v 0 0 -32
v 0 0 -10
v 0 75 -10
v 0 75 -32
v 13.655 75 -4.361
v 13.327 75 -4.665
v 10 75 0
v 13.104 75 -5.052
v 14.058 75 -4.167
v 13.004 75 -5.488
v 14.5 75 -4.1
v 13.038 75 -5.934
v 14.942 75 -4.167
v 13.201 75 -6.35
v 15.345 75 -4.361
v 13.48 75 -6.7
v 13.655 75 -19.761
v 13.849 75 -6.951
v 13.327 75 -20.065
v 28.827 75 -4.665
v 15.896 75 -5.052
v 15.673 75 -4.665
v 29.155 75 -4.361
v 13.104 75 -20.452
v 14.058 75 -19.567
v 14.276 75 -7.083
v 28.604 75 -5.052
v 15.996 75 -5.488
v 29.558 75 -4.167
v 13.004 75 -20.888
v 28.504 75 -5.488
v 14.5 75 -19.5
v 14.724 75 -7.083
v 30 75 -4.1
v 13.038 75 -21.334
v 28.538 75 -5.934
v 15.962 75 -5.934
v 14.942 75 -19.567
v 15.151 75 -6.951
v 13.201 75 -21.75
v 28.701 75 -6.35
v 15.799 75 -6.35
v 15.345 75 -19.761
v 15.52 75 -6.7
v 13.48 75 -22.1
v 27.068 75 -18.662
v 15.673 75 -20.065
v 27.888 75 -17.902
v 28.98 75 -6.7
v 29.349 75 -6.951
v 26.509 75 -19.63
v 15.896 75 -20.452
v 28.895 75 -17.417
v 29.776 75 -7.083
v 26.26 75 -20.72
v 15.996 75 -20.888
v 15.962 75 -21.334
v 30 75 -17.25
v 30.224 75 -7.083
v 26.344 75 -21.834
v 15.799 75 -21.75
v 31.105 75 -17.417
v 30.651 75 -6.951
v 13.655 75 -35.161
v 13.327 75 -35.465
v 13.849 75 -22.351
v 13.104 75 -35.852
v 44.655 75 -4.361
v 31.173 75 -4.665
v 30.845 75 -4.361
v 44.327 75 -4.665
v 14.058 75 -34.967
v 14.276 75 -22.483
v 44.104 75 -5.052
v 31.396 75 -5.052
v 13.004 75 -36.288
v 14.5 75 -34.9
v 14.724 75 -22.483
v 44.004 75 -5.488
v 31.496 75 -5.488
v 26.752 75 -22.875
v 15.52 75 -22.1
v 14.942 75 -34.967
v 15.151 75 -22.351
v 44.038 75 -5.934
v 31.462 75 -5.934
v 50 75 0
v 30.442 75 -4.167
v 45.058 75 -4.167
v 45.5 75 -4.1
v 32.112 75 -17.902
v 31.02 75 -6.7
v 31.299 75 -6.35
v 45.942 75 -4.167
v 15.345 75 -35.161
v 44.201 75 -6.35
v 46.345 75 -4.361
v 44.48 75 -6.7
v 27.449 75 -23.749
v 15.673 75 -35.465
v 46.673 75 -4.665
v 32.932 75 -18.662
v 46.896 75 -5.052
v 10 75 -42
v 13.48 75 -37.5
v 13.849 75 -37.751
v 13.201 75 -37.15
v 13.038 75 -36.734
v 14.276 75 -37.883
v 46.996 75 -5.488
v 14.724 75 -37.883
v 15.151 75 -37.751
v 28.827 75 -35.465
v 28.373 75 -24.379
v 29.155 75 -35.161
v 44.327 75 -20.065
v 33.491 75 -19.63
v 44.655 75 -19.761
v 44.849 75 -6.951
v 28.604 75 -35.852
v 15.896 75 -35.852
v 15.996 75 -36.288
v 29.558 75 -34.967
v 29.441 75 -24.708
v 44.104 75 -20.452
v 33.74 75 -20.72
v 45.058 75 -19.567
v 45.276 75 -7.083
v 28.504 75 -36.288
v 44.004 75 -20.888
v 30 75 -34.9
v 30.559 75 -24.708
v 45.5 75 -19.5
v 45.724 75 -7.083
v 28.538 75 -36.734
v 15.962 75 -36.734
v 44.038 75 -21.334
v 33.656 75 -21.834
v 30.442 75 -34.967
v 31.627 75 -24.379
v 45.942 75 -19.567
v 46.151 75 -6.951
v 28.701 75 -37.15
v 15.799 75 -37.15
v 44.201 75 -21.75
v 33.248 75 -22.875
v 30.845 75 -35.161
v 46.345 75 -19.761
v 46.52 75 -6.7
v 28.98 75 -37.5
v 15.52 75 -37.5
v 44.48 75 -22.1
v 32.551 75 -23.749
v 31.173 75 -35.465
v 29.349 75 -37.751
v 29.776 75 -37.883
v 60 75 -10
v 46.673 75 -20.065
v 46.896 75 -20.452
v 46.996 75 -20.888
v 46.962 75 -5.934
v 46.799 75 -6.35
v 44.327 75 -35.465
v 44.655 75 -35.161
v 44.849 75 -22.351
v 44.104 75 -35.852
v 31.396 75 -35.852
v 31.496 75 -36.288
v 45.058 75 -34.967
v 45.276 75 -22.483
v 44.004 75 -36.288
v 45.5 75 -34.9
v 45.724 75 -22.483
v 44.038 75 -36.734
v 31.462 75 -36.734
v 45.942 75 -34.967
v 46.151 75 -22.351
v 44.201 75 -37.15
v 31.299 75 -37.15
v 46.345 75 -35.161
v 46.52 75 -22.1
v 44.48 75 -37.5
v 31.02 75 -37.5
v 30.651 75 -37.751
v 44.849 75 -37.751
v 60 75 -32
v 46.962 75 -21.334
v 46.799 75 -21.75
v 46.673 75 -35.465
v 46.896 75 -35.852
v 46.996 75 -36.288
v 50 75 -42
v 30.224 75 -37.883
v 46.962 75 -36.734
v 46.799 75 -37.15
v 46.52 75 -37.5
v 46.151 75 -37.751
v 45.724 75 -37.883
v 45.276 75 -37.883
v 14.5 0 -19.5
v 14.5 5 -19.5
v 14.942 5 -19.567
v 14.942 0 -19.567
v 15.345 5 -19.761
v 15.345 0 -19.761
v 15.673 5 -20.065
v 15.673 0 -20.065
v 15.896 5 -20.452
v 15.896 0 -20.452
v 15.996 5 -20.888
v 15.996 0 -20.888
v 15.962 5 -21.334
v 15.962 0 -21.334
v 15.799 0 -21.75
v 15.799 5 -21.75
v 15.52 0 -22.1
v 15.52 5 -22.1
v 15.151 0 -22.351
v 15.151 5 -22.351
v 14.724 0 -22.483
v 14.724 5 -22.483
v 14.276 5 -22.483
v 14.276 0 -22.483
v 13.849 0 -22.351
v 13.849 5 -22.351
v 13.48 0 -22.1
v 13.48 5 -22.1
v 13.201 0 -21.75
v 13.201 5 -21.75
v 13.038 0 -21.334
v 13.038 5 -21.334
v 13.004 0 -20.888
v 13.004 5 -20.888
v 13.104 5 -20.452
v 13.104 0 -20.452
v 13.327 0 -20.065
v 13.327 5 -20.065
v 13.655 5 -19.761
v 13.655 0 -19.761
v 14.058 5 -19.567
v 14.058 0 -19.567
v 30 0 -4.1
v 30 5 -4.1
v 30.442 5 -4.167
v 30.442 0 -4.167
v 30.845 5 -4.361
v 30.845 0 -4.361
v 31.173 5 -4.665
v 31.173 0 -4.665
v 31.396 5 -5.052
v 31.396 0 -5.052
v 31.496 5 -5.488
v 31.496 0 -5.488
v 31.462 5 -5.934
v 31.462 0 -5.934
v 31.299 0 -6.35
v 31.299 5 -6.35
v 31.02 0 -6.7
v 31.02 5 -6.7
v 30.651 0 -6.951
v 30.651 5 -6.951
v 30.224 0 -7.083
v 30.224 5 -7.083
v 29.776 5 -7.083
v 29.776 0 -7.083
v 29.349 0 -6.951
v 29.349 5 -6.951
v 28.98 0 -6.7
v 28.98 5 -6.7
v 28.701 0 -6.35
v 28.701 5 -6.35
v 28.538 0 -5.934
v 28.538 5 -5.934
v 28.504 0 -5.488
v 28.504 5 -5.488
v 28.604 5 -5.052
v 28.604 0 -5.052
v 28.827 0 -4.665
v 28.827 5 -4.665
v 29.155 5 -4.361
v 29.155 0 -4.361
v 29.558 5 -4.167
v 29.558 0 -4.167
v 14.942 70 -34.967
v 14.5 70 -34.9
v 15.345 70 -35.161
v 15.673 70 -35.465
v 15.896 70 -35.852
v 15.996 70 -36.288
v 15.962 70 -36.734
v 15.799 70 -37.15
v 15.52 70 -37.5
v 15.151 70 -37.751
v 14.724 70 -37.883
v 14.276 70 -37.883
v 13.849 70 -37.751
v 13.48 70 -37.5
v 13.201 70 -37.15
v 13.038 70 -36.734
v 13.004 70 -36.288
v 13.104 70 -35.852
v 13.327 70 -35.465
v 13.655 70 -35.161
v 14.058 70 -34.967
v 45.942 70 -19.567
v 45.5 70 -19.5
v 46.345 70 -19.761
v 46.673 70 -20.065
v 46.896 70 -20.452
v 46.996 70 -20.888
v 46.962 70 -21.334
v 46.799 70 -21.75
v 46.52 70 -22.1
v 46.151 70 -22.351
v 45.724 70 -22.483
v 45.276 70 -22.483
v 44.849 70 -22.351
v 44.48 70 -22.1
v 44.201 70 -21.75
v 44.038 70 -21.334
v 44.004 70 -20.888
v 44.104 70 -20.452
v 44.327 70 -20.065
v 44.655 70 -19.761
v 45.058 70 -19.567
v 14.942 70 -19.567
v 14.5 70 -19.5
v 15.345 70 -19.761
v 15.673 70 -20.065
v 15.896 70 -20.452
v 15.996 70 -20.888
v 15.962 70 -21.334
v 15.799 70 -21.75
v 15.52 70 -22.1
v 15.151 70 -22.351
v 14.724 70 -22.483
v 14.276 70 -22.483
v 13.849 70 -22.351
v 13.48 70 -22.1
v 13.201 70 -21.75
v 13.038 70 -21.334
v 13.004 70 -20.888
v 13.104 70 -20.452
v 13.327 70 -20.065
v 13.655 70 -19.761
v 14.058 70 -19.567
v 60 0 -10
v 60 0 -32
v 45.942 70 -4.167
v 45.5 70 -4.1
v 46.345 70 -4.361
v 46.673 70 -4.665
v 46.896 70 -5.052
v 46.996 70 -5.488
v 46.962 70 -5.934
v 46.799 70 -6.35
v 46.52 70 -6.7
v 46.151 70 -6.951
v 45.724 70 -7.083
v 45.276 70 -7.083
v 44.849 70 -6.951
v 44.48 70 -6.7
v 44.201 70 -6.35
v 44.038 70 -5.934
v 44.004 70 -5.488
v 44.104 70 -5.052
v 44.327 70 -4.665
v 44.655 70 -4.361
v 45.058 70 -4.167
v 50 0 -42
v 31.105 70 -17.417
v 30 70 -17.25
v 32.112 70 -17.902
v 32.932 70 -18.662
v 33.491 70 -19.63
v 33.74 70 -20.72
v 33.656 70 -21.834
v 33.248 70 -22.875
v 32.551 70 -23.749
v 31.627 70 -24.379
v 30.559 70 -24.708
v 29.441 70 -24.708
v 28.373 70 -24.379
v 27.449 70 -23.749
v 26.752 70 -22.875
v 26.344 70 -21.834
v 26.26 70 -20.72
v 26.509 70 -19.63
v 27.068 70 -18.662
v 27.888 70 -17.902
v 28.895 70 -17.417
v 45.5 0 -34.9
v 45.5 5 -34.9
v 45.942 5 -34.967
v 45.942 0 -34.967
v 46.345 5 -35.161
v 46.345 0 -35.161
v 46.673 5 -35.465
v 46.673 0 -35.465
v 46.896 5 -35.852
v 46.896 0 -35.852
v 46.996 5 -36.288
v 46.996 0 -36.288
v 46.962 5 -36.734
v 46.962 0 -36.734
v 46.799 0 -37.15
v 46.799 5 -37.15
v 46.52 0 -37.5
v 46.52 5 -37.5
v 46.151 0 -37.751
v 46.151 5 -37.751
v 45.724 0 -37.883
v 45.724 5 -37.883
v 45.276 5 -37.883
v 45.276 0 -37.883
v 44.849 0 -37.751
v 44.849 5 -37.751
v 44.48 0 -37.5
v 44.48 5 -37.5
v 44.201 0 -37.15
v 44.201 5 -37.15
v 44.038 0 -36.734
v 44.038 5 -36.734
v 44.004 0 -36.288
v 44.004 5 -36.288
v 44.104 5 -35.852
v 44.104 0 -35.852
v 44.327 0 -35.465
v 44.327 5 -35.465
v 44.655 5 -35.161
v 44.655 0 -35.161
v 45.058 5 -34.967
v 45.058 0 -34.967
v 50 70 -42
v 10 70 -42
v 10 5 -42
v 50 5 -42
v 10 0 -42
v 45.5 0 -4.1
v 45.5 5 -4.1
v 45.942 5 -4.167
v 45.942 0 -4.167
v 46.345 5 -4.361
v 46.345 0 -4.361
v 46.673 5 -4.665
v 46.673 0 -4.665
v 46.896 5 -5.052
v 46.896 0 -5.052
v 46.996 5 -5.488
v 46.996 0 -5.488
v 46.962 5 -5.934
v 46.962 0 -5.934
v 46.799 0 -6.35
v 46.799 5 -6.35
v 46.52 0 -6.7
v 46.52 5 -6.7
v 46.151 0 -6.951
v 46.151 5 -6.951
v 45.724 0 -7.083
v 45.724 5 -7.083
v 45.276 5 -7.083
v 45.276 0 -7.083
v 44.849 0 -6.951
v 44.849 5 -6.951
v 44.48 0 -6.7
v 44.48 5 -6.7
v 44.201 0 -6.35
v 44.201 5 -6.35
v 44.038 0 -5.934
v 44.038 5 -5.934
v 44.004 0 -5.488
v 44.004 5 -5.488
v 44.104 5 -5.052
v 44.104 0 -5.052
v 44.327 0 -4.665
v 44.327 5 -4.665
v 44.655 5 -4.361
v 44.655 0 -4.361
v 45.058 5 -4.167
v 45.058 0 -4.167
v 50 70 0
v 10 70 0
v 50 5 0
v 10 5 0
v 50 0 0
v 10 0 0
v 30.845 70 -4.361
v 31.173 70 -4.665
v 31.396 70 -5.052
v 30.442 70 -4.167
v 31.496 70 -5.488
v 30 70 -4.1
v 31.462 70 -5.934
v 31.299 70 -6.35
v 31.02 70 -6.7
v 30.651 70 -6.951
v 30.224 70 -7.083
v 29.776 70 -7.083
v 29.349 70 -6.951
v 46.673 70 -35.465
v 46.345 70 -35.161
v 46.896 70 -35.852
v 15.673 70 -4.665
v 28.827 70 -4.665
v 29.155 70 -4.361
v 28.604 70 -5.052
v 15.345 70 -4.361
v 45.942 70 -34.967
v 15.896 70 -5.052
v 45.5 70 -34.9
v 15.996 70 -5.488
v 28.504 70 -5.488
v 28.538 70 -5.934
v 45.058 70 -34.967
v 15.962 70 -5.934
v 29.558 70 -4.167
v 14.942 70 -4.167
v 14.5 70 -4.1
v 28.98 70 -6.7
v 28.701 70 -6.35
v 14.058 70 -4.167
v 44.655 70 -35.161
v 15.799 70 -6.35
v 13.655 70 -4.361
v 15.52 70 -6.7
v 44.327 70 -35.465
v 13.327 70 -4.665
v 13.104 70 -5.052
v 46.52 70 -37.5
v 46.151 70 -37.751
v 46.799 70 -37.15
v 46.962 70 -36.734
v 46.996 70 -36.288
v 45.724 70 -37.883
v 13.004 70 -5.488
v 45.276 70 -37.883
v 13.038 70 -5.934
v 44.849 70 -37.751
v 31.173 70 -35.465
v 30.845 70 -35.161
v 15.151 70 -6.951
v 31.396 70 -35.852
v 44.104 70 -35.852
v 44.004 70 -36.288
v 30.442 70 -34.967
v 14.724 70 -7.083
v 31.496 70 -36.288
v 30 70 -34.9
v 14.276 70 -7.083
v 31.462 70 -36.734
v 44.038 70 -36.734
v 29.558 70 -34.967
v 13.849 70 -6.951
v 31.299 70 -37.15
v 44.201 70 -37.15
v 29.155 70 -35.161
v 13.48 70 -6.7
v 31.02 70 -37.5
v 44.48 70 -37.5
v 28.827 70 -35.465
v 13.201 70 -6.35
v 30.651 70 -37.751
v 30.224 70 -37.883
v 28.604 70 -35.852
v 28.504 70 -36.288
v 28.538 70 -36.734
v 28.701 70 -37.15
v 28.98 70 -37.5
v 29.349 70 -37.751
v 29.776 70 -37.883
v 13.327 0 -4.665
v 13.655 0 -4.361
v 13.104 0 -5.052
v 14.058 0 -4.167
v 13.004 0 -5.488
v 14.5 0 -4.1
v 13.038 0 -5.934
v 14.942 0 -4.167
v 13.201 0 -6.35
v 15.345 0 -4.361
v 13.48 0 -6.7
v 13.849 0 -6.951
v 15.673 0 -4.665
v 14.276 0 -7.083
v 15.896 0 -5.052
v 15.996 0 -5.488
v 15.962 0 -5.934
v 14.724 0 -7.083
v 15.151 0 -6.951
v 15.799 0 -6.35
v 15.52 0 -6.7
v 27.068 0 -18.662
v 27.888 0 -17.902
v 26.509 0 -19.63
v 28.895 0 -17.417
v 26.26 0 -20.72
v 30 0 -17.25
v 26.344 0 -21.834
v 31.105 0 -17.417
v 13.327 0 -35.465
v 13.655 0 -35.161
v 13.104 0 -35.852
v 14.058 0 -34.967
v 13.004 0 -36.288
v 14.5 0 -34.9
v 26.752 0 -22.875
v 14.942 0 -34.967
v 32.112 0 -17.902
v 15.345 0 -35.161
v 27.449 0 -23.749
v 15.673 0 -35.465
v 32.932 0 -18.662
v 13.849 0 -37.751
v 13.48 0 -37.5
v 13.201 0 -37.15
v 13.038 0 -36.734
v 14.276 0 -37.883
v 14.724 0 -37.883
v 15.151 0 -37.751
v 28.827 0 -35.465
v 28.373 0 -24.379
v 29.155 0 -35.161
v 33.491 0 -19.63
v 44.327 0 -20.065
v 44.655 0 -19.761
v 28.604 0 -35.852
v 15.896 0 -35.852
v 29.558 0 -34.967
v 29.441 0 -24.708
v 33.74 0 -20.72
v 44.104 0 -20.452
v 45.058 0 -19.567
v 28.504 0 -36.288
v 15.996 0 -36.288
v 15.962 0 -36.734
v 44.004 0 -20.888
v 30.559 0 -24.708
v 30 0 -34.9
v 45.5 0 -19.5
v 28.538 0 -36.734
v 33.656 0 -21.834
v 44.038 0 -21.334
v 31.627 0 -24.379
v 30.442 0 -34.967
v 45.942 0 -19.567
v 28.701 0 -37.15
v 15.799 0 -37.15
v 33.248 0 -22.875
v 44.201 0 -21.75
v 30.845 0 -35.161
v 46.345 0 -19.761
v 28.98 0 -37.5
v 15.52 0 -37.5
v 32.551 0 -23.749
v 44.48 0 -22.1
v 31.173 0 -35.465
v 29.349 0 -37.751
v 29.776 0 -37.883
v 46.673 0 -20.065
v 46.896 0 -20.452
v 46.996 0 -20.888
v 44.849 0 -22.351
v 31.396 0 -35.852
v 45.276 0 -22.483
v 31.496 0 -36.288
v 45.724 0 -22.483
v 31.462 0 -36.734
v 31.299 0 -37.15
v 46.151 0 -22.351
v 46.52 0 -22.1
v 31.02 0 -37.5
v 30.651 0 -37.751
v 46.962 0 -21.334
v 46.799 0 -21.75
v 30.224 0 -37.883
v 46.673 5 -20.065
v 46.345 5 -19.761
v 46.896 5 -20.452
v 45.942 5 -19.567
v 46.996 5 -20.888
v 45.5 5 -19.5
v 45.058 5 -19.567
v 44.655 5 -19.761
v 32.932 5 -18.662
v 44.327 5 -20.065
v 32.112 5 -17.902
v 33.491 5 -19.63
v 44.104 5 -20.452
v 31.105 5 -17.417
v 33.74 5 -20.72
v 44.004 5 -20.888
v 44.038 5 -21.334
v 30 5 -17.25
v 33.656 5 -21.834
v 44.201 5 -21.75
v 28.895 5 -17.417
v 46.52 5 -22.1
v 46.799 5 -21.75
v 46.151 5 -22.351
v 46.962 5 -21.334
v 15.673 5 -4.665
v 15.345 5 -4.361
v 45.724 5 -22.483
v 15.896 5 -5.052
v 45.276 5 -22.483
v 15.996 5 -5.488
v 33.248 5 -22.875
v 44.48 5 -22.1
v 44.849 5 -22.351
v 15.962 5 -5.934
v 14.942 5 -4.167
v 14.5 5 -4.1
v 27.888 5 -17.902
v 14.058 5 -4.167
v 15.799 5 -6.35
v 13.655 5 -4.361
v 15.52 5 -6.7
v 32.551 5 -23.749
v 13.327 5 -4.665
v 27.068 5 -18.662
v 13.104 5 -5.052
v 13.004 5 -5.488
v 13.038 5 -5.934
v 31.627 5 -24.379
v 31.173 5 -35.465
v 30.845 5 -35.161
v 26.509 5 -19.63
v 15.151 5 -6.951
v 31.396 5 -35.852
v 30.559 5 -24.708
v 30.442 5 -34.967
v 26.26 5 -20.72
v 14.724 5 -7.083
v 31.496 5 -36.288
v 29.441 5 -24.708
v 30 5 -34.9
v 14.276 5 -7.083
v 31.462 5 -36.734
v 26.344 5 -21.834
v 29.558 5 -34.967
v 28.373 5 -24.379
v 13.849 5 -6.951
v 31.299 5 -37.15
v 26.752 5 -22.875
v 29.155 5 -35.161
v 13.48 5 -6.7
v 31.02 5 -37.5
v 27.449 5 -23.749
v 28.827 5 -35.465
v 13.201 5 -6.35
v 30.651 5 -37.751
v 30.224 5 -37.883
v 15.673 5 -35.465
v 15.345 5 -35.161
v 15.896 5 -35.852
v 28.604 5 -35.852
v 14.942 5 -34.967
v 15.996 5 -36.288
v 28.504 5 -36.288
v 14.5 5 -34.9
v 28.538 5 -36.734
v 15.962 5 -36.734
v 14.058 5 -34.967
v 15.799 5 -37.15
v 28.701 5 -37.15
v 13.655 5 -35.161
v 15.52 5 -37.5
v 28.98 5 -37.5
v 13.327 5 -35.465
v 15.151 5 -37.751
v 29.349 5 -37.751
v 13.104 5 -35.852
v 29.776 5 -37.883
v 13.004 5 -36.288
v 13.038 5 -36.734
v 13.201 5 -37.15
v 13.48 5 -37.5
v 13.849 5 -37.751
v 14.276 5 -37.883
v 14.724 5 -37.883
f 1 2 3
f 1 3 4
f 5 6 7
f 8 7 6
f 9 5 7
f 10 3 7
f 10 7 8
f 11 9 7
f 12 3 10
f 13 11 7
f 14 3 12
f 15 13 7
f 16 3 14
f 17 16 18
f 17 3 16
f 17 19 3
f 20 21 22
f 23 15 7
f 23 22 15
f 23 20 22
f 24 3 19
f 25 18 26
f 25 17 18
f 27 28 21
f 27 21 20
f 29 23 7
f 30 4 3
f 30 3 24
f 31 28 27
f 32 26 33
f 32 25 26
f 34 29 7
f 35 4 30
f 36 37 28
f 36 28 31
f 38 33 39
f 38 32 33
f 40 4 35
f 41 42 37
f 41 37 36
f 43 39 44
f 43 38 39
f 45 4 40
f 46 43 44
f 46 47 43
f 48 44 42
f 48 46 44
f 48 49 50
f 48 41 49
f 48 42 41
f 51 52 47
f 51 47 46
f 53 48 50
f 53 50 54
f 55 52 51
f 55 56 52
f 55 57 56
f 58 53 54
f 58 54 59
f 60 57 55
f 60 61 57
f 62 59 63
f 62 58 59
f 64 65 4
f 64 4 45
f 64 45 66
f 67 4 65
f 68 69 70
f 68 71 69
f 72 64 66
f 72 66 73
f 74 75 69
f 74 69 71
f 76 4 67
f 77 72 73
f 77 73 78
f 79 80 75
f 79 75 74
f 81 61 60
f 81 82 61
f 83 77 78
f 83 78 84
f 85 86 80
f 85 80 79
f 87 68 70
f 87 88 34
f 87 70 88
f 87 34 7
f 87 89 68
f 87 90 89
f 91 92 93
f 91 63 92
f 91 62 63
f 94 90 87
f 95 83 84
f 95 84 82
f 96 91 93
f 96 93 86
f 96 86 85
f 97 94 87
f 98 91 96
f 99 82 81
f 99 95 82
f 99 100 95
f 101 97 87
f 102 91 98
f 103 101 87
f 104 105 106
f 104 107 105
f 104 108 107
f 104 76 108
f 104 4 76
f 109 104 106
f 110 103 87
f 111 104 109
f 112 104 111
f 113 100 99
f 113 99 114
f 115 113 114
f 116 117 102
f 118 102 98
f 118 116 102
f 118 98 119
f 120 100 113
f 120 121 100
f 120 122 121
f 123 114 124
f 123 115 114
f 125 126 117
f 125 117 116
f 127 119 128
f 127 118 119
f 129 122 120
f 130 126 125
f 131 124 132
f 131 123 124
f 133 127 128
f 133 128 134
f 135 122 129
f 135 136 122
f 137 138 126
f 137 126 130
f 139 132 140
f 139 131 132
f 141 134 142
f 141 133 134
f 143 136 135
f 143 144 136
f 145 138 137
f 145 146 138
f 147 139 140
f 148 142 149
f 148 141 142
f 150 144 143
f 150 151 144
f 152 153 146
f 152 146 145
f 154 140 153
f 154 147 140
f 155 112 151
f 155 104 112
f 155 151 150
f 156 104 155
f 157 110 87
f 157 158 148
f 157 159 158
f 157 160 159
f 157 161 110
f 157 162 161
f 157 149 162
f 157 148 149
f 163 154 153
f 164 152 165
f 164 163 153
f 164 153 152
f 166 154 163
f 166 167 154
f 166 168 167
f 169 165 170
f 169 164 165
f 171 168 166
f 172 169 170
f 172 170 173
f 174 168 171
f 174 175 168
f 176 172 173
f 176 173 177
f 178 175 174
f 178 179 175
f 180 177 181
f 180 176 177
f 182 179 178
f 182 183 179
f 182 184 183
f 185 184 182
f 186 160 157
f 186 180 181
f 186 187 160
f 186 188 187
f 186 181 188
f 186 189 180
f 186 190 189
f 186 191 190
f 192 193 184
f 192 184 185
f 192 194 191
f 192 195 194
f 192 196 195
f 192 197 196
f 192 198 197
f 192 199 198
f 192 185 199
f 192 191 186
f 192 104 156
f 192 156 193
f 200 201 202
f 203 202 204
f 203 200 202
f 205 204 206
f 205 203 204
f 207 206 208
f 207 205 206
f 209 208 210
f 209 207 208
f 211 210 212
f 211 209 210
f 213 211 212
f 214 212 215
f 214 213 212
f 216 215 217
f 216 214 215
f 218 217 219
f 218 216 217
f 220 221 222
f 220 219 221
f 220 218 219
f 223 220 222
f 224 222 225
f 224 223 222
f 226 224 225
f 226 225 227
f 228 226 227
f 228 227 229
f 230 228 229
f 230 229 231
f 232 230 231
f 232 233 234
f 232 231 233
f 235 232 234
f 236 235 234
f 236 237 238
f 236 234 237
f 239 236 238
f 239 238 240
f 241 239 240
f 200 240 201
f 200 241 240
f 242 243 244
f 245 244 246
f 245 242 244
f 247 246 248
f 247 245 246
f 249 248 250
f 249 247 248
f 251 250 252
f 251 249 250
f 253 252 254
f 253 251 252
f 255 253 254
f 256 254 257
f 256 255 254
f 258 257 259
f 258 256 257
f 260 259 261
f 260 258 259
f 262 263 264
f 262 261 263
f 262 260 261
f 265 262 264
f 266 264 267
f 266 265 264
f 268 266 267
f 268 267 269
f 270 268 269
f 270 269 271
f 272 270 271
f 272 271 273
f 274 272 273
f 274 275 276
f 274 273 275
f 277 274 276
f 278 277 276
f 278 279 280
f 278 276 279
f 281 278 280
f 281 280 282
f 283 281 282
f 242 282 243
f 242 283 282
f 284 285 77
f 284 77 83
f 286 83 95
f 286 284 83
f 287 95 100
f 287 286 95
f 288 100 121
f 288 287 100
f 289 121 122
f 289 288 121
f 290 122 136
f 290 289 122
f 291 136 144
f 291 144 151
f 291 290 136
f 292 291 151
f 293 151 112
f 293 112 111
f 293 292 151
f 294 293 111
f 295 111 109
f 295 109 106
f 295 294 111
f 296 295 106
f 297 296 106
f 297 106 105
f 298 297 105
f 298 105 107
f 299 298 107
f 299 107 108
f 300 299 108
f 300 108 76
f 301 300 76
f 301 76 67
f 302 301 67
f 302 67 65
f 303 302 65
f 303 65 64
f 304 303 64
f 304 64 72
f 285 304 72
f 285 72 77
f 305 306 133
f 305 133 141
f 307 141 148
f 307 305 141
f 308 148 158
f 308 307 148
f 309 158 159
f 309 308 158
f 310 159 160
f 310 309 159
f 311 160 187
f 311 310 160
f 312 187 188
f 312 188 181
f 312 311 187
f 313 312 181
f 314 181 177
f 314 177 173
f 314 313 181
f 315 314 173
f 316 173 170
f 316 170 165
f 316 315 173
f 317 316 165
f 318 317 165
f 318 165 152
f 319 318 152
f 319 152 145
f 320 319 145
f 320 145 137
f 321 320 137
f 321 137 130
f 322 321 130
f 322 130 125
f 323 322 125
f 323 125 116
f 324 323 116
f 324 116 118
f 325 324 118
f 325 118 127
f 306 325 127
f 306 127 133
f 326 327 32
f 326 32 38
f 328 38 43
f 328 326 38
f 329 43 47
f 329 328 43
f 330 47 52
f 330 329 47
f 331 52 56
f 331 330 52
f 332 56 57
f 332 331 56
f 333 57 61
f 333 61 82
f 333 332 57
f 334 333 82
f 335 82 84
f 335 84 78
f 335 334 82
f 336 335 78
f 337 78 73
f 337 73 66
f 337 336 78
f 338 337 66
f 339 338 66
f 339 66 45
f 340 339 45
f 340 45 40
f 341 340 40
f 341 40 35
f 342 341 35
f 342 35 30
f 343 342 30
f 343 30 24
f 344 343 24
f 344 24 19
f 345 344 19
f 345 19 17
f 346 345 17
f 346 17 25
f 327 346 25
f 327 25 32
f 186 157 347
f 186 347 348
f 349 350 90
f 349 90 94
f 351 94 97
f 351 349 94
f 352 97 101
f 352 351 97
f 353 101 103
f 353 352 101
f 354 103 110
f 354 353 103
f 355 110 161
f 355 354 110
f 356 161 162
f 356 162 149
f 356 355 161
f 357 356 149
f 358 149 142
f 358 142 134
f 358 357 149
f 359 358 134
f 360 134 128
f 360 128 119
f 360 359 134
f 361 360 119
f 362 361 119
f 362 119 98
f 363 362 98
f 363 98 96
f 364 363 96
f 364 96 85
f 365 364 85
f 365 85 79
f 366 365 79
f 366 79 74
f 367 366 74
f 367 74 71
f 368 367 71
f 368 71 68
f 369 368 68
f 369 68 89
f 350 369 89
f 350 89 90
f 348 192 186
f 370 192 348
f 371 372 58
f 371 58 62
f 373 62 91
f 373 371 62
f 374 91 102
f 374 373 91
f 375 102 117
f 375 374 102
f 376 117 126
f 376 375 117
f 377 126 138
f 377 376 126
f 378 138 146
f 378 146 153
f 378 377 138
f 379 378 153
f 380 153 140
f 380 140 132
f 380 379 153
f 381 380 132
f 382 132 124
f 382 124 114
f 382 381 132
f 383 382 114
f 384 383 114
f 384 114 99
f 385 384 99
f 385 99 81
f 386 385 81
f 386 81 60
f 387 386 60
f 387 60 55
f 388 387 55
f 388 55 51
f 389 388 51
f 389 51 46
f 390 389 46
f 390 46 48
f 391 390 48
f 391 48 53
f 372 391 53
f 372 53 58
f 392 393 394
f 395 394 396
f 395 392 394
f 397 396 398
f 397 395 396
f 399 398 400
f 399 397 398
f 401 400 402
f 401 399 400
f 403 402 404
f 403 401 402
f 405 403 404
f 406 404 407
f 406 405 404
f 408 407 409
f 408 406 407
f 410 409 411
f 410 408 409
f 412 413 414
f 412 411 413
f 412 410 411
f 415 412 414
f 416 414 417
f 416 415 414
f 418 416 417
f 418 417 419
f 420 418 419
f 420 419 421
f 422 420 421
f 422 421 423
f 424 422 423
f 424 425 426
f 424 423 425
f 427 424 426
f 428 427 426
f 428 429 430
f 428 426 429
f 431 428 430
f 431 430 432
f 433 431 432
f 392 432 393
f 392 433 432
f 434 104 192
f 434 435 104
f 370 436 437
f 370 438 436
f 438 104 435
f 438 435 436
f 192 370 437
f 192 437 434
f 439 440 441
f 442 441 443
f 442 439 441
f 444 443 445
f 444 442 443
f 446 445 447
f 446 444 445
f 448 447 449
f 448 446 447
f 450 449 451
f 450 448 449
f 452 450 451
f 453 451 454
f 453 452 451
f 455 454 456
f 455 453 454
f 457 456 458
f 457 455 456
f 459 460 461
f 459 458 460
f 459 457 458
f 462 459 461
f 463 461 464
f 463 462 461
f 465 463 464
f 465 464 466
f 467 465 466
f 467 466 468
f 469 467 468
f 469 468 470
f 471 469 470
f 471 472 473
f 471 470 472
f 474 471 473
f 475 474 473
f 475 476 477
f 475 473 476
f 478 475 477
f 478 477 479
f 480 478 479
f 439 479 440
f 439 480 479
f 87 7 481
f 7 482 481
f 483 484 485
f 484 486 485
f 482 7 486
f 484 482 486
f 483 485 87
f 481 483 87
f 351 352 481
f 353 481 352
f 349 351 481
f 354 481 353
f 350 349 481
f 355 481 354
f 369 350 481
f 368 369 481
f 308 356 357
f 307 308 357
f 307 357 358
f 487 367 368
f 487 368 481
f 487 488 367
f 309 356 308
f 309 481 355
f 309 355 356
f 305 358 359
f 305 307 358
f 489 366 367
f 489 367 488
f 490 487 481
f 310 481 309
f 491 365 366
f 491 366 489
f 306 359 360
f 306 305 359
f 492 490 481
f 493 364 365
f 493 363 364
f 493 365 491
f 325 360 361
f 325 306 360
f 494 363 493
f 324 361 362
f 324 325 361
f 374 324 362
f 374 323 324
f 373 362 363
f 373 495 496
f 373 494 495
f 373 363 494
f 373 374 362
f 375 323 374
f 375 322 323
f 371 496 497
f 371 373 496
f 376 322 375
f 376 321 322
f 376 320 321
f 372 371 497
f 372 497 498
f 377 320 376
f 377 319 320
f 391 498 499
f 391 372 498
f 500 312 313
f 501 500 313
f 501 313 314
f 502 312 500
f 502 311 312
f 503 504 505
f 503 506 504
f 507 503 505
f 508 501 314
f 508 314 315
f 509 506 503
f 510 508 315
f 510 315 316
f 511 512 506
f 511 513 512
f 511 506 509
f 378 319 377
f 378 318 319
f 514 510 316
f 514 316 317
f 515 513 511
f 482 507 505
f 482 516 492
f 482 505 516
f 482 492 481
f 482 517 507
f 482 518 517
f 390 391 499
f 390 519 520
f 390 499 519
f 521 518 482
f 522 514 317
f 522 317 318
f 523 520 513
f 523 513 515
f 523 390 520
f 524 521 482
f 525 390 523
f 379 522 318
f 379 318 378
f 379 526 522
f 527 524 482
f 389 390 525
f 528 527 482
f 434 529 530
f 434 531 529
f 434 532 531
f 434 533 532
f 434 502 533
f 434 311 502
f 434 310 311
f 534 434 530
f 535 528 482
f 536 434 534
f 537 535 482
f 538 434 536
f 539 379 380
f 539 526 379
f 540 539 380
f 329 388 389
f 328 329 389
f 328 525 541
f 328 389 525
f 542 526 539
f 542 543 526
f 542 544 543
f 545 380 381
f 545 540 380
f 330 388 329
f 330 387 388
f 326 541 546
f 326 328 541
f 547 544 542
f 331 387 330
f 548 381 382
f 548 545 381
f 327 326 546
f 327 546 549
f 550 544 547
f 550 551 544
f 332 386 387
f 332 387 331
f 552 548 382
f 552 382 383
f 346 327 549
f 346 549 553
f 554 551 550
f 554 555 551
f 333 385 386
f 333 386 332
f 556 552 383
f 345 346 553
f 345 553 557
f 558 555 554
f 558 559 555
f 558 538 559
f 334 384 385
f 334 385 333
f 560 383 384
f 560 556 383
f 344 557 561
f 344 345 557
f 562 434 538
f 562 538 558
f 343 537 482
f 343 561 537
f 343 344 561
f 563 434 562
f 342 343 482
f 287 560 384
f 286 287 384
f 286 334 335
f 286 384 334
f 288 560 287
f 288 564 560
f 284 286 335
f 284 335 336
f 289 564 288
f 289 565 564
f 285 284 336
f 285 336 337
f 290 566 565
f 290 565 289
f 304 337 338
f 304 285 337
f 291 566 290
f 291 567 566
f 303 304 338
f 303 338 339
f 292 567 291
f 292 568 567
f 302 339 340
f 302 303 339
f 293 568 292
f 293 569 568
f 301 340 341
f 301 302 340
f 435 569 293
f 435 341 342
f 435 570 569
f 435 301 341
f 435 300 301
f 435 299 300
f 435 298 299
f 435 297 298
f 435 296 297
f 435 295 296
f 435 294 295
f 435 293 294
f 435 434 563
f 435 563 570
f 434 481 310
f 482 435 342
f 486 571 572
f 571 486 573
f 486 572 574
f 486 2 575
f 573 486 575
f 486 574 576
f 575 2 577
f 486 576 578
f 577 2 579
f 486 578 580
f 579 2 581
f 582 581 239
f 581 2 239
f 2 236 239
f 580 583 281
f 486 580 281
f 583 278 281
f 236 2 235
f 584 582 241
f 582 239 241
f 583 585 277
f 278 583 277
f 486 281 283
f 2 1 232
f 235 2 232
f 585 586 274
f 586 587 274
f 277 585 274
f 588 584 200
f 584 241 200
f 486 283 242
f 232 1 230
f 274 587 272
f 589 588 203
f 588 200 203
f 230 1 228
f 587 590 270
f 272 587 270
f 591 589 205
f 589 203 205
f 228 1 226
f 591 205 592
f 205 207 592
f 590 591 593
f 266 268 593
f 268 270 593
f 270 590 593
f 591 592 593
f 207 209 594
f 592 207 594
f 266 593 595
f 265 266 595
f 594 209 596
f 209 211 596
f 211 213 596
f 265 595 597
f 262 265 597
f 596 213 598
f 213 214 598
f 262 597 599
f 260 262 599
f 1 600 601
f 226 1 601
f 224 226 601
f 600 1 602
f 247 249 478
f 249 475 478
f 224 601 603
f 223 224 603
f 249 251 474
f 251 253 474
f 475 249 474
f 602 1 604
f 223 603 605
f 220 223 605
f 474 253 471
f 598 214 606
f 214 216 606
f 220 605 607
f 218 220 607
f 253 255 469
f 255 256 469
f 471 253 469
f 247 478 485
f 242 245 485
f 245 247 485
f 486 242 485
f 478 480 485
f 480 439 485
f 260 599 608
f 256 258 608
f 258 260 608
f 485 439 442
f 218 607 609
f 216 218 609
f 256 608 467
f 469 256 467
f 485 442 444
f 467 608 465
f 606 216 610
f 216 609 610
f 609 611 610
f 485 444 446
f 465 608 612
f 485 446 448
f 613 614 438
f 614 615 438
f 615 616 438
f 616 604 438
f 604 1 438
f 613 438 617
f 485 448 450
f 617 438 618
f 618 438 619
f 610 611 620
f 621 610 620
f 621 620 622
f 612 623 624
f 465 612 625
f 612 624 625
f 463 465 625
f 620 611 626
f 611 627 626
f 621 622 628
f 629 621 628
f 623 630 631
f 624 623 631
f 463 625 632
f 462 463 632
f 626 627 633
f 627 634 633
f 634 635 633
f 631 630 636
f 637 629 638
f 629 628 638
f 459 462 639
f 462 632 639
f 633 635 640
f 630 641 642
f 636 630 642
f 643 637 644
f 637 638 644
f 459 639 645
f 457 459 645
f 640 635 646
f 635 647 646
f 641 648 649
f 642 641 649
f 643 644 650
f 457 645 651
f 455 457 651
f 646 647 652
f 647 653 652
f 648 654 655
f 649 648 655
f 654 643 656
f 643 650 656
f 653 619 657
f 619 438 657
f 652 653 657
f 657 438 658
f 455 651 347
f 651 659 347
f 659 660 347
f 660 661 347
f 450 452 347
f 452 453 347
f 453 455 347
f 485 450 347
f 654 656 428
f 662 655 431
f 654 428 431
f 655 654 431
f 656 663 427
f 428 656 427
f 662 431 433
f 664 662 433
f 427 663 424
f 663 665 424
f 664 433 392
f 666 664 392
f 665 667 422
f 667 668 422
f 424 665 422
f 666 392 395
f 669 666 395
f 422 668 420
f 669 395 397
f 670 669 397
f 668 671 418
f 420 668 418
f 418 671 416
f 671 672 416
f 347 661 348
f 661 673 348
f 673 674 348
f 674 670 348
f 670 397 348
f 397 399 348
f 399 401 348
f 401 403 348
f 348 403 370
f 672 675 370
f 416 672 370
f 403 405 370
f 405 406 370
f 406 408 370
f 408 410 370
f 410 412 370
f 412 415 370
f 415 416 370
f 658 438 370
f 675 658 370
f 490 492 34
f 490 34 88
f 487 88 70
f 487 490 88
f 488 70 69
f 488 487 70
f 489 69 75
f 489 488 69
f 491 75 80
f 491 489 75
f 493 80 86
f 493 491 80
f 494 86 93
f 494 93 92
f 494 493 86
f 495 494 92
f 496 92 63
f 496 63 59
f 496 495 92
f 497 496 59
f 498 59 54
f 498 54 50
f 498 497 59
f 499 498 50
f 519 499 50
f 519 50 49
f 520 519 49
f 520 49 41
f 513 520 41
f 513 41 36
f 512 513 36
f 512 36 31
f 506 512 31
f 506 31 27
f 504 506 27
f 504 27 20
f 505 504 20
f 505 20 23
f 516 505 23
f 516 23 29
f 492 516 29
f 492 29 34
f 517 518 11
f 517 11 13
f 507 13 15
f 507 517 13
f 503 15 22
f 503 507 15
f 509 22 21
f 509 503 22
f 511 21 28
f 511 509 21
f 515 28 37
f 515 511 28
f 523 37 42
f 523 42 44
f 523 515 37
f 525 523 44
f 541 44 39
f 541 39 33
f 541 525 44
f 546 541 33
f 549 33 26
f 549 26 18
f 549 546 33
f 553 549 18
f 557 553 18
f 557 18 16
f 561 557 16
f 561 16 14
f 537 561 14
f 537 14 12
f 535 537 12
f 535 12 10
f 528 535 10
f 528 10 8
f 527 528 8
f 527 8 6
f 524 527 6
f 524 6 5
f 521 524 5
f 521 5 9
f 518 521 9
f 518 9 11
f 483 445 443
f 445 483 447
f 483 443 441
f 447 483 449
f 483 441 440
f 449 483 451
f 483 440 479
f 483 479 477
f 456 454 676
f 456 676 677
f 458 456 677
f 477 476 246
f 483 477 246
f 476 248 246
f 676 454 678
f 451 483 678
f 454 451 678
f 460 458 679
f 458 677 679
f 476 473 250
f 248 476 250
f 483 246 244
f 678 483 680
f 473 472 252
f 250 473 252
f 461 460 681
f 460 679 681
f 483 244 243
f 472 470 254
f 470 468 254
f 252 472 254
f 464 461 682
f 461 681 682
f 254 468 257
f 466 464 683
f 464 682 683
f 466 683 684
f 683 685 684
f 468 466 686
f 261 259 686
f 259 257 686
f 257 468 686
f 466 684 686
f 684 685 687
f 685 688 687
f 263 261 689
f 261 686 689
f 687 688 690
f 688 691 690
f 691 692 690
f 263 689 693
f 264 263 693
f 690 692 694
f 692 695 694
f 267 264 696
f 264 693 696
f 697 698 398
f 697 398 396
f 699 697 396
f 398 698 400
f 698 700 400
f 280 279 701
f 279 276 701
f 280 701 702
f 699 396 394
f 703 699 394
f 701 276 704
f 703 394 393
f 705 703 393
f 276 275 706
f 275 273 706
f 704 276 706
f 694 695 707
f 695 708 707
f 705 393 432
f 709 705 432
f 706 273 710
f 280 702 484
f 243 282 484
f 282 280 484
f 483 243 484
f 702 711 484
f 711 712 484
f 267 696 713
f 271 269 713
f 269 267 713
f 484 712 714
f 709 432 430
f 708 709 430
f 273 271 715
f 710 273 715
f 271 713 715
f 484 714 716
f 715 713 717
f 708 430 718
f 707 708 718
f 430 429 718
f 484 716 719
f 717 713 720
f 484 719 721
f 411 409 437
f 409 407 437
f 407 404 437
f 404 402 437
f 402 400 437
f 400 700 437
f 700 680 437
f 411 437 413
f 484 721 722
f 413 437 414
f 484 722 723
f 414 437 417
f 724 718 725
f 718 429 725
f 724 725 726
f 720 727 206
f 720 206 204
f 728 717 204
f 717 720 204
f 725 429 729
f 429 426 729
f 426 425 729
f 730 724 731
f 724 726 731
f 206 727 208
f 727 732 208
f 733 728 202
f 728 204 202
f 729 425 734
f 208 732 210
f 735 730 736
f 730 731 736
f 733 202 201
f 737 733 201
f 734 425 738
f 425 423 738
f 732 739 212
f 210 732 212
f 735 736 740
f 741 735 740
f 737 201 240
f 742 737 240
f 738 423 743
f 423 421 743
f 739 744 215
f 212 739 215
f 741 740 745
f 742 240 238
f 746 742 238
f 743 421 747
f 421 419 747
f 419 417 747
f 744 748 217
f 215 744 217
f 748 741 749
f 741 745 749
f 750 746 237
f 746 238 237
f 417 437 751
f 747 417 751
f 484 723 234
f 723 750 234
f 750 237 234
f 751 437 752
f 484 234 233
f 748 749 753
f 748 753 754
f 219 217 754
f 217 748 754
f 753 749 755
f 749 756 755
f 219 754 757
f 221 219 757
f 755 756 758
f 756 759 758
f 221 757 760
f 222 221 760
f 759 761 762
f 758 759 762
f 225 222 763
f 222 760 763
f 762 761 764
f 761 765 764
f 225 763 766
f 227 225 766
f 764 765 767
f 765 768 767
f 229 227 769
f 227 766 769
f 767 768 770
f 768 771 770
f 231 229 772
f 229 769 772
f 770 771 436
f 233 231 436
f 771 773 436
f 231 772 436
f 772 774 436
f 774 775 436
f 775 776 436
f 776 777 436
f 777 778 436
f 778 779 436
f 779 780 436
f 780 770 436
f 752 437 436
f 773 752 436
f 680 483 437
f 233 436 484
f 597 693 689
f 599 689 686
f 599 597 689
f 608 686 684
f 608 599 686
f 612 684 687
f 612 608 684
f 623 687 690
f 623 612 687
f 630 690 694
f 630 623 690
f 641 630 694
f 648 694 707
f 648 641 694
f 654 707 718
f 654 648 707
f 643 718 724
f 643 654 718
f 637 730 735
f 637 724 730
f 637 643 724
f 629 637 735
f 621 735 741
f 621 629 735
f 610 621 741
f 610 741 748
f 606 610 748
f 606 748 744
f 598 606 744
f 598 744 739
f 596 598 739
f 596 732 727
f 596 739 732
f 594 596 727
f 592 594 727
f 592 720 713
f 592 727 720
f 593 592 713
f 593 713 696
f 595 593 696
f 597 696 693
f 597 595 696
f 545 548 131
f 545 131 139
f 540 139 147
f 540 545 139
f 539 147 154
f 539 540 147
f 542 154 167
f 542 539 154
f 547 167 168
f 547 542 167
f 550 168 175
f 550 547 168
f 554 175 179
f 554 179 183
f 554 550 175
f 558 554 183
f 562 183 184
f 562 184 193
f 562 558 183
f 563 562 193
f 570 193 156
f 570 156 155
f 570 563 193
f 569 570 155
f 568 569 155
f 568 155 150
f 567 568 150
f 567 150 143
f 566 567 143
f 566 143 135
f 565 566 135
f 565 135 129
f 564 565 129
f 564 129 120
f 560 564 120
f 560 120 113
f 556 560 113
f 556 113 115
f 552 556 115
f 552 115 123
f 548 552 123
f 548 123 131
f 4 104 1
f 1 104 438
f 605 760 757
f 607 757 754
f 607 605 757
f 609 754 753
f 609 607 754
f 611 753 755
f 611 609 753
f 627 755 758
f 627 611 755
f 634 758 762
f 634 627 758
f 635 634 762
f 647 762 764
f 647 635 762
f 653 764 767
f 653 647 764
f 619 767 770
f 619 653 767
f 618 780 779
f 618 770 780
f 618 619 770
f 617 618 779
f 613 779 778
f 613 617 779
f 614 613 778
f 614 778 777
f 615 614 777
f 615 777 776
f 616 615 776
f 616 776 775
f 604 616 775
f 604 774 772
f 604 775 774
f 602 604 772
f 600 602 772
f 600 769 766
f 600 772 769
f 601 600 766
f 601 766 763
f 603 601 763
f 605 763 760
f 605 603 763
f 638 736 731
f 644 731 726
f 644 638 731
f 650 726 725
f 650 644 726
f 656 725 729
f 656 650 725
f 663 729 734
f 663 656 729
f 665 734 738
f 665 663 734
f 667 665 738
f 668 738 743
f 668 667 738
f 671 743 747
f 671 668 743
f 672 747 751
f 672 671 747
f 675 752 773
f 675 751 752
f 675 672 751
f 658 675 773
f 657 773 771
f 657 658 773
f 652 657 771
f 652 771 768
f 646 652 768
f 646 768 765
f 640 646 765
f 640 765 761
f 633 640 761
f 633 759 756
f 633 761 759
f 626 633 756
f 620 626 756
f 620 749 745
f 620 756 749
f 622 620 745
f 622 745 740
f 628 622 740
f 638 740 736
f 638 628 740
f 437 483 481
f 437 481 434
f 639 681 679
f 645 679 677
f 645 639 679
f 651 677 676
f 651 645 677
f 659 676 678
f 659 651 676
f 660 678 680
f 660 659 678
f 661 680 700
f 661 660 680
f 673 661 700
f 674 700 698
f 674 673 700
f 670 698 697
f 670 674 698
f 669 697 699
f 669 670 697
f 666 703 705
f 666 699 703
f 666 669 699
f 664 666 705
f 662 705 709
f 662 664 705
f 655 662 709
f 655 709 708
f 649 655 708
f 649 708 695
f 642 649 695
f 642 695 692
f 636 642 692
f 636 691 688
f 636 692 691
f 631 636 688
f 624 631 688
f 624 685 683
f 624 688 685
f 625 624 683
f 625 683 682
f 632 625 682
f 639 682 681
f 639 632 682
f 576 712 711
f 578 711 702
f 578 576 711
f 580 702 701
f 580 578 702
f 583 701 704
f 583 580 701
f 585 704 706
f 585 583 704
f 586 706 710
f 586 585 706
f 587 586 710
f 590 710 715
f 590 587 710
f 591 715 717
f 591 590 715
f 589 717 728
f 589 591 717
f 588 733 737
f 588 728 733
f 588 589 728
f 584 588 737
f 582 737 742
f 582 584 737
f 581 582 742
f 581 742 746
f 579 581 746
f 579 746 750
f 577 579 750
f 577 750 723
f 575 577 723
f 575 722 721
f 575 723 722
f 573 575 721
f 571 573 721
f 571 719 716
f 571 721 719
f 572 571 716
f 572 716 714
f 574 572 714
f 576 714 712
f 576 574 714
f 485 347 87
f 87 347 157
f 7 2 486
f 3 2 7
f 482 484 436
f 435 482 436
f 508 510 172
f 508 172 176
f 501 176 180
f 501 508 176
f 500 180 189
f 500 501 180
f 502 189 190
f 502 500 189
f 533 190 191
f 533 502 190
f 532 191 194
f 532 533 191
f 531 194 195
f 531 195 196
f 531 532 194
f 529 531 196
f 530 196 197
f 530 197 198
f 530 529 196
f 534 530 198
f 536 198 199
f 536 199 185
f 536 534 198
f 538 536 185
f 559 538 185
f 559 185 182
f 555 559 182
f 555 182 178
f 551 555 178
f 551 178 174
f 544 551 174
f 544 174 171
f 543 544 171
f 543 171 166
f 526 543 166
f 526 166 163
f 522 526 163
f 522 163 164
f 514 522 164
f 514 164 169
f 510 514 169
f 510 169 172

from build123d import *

# Parameters (mm, degrees)
SKETCH3_W           = 60
SKETCH3_H           = 42
SKETCH3_R           = 3.75
SKETCH3_R_2         = 1.5
BOSS_EXTRUDE1_DEPTH = 75
SKETCH4_W           = 60
SKETCH4_H           = 65
CUT_EXTRUDE1_DEPTH  = 105.828431258
BOSS_EXTRUDE2_REACH = 103.311
SKETCH5_W           = 10
SKETCH5_H           = 42
CHAMFER2_SIZE       = 10


with BuildPart() as part:
    # Sketch3 → Boss-Extrude1 (new body)
    with BuildSketch(Plane(origin=(0, 0, 0), x_dir=(1, 0, 0), z_dir=(0, 1, 0))):
        with Locations((30, 21)):
            Rectangle(SKETCH3_W, SKETCH3_H)
        with Locations(Location((30, 21, 0), (0, 0, 270))):
            Circle(SKETCH3_R, mode=Mode.SUBTRACT)
        with Locations(Location((14.5, 36.4, 0), (0, 0, 270))):
            Circle(SKETCH3_R_2, mode=Mode.SUBTRACT)
        with Locations(Location((45.5, 36.4, 0), (0, 0, 270))):
            Circle(SKETCH3_R_2, mode=Mode.SUBTRACT)
        with Locations(Location((45.5, 5.6, 0), (0, 0, 270))):
            Circle(SKETCH3_R_2, mode=Mode.SUBTRACT)
        with Locations(Location((14.5, 5.6, 0), (0, 0, 270))):
            Circle(SKETCH3_R_2, mode=Mode.SUBTRACT)
        with Locations(Location((30, 36.4, 0), (0, 0, 270))):
            Circle(SKETCH3_R_2, mode=Mode.SUBTRACT)
        with Locations(Location((45.5, 21, 0), (0, 0, 270))):
            Circle(SKETCH3_R_2, mode=Mode.SUBTRACT)
        with Locations(Location((30, 5.6, 0), (0, 0, 270))):
            Circle(SKETCH3_R_2, mode=Mode.SUBTRACT)
        with Locations(Location((14.5, 21, 0), (0, 0, 270))):
            Circle(SKETCH3_R_2, mode=Mode.SUBTRACT)
    extrude(amount=BOSS_EXTRUDE1_DEPTH)

    # Sketch4 → Cut-Extrude1 (cut, through all)
    with BuildSketch(Plane(origin=(0, 0, -42), x_dir=(-1, 0, 0), z_dir=(0, 0, -1))):
        with Locations((-30, 37.5)):
            Rectangle(SKETCH4_W, SKETCH4_H)
    extrude(amount=-CUT_EXTRUDE1_DEPTH, mode=Mode.SUBTRACT)


with BuildPart() as cut_extrude1_piece_1:
    # of the separate pieces the step leaves, piece 1, a body of its own (cut_extrude1_pieces)
    add(part.part.solids().sort_by_distance((60, 70, 0))[0])

    # Sketch5 → Boss-Extrude2 (add, up to next)
    with BuildSketch(Plane(origin=(0, 5, 0), x_dir=(1, 0, 0), z_dir=(0, 1, 0)), mode=Mode.PRIVATE) as boss_extrude2_sk1:
        with Locations((5, 21)):
            Rectangle(SKETCH5_W, SKETCH5_H)
    boss_extrude2_tool1 = extrude(boss_extrude2_sk1.sketch, amount=BOSS_EXTRUDE2_REACH, mode=Mode.PRIVATE) - cut_extrude1_piece_1.part
    # Sketch5 → Boss-Extrude2 (add, up to next)
    with BuildSketch(Plane(origin=(0, 5, 0), x_dir=(1, 0, 0), z_dir=(0, 1, 0)), mode=Mode.PRIVATE) as boss_extrude2_sk2:
        with Locations((55, 21)):
            Rectangle(SKETCH5_W, SKETCH5_H)
    boss_extrude2_tool2 = extrude(boss_extrude2_sk2.sketch, amount=BOSS_EXTRUDE2_REACH, mode=Mode.PRIVATE) - cut_extrude1_piece_1.part


with BuildPart() as cut_extrude1_piece_2:
    # of the separate pieces the step leaves, piece 2, a body of its own (cut_extrude1_pieces)
    add(part.part.solids().sort_by_distance((0, 0, 0))[0])


with BuildPart() as cut_extrude1_piece_1_1:
    add(cut_extrude1_piece_1.part)

    add(cut_extrude1_piece_2.part)  # Boss-Extrude2 merges Cut-Extrude1 piece 2
    add(boss_extrude2_tool1.solids().sort_by_distance((5, 5, -21))[0])
    add(boss_extrude2_tool2.solids().sort_by_distance((55, 5, -21))[0])

    # Chamfer2
    chamfer2_edges = [cut_extrude1_piece_1_1.edges().sort_by_distance(p)[0] for p in [
        (0, 37.5, -42),
        (0, 37.5, 0),
        (60, 37.5, 0),
        (60, 37.5, -42),
    ]]
    chamfer(chamfer2_edges, length=CHAMFER2_SIZE - 0.0001)  # a hair under: the kernel refuses the full size


solid = cut_extrude1_piece_1_1.part
